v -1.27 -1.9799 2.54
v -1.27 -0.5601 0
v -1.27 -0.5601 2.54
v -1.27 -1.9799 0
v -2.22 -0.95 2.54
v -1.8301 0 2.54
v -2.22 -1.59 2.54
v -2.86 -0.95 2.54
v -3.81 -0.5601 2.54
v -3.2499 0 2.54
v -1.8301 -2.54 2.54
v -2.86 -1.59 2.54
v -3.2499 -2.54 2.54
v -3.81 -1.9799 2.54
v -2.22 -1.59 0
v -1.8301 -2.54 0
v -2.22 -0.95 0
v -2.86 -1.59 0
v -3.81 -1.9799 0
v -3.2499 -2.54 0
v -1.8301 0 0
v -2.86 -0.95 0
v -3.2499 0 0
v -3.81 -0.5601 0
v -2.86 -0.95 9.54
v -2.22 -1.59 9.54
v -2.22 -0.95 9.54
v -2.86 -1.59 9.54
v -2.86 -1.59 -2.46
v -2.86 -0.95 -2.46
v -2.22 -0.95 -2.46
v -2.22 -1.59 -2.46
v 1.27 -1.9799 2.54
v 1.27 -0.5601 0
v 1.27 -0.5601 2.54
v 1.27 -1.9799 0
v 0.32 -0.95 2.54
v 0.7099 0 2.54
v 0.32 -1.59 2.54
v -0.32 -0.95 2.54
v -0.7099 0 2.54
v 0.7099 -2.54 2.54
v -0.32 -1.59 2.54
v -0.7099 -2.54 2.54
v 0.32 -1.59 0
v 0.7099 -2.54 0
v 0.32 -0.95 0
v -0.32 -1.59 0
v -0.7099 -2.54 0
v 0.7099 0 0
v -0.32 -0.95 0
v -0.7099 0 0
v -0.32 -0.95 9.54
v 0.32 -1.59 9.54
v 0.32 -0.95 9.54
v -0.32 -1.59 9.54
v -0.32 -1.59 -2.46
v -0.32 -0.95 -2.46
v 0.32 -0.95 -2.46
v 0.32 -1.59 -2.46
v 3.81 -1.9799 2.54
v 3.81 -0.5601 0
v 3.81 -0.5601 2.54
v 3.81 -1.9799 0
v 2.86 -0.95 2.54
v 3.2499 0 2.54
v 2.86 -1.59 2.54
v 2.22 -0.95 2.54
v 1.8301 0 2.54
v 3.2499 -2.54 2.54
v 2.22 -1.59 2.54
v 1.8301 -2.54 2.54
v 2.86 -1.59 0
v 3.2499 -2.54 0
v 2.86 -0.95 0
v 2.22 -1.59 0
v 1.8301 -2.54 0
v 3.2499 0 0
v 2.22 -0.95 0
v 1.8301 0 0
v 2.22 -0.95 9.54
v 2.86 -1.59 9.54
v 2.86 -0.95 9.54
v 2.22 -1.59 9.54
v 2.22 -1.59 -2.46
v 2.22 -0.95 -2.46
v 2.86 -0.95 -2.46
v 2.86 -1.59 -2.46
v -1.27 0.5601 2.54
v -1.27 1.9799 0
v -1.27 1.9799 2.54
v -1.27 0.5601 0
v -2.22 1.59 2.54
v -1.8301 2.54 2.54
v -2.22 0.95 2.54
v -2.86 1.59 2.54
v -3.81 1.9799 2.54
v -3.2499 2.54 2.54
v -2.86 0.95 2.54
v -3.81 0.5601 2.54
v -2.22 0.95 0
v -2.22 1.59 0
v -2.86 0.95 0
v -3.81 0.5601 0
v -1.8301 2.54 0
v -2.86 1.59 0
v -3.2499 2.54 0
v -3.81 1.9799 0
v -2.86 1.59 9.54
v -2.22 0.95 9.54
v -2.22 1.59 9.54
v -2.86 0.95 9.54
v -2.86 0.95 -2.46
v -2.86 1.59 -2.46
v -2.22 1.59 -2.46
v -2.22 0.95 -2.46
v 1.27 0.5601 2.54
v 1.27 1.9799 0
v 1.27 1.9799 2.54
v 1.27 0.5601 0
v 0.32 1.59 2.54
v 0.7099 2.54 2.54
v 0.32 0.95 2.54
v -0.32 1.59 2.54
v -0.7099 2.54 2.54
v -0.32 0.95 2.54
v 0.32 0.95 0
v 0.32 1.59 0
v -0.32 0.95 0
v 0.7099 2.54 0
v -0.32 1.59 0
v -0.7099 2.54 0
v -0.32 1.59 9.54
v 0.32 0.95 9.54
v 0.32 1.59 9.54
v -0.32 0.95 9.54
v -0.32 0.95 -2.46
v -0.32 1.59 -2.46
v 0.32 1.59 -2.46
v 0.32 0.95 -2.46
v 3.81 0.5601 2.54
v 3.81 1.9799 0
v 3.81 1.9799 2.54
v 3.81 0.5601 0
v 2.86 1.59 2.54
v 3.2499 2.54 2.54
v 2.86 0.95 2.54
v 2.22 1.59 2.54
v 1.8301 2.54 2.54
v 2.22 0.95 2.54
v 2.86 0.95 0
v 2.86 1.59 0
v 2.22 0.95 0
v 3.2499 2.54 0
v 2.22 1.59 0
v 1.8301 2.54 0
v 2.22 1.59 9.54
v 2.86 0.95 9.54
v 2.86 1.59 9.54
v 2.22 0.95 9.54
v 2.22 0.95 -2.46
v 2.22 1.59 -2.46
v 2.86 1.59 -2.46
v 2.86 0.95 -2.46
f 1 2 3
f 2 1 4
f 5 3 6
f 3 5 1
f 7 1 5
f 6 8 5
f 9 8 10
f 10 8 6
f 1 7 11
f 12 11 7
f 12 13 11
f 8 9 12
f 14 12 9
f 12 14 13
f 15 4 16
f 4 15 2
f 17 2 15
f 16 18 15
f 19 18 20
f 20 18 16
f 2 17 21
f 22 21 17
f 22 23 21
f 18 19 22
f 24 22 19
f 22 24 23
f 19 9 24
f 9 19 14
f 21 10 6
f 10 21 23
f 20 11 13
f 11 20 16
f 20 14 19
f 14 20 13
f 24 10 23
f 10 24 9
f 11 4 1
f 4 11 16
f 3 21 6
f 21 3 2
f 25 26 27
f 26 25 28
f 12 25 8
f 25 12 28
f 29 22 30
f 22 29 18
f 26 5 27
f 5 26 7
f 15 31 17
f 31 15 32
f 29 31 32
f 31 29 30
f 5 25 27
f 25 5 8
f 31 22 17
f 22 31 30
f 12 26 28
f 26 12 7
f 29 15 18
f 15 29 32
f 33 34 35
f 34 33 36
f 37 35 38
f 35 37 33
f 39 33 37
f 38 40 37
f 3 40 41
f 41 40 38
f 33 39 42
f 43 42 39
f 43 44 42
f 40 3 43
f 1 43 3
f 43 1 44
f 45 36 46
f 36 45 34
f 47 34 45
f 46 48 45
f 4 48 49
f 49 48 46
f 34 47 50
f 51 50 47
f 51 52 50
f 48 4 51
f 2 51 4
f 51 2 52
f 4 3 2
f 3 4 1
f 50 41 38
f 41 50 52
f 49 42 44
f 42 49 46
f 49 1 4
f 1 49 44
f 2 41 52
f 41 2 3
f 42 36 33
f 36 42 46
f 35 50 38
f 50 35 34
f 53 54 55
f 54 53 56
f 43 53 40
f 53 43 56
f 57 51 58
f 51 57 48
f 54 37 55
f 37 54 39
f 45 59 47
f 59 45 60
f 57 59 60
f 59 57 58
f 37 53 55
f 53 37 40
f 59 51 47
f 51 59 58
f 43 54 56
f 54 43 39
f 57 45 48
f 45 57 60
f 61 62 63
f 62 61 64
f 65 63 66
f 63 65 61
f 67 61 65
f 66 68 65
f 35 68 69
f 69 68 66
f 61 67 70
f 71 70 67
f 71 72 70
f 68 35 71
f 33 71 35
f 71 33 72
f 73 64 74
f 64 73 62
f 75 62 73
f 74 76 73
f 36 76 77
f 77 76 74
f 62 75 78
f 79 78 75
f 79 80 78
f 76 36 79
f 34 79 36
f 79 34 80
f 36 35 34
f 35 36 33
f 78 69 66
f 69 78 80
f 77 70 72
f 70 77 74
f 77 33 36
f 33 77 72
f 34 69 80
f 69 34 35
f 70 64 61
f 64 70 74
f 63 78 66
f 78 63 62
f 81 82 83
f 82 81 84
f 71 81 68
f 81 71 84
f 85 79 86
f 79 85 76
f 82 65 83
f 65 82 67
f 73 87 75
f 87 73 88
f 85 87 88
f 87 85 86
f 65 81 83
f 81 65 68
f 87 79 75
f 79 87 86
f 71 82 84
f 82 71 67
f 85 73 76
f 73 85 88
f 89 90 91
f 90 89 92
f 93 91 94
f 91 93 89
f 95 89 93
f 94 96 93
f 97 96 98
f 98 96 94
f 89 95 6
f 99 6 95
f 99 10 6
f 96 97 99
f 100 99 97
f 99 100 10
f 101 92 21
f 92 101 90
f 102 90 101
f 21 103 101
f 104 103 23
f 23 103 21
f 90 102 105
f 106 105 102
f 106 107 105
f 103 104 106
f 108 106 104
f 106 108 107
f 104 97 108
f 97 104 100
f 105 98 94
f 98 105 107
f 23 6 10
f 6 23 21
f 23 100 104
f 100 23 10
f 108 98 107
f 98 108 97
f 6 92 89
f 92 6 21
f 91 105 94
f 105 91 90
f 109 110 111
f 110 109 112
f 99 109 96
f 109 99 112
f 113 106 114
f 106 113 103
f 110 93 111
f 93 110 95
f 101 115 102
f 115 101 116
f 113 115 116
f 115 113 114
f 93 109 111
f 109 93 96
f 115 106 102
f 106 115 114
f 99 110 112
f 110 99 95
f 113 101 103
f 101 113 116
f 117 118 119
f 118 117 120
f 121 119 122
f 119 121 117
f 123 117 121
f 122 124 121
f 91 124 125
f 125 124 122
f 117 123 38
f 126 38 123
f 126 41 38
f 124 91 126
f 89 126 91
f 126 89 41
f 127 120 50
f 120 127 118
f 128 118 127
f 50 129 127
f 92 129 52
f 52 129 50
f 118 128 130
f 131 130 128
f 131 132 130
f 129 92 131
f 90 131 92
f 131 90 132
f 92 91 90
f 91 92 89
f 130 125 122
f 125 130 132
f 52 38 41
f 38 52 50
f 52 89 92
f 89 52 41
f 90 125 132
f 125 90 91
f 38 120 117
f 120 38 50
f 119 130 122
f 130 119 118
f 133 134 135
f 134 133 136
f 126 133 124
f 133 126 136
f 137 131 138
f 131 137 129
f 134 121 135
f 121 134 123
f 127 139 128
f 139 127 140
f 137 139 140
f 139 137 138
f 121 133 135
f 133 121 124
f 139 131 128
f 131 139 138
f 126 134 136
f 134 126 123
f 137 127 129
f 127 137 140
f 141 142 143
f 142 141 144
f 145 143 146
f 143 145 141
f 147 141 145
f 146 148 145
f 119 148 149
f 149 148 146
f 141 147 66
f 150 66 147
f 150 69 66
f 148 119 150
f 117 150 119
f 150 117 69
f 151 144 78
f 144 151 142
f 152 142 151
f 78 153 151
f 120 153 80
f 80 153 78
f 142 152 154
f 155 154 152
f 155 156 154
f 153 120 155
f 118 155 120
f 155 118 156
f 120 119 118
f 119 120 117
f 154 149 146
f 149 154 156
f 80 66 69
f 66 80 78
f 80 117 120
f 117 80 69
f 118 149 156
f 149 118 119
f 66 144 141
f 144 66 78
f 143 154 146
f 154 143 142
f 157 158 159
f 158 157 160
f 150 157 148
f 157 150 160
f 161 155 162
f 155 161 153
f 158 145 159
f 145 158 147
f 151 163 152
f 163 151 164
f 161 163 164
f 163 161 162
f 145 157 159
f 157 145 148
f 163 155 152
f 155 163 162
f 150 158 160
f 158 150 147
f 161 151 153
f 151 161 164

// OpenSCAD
// pin_headers.scad
//
// Model of through-hole pin headers. 
// 
// Units are metric
//
// "height" is the total length of the pin. Default is 12mm.
// "upper" is the length of the pin above the stopper. Default is 7mm.
// "rows" is the number of rows. Default is 3.
// "cols" is the number of columns. Default is 2.
//
// Examples:
pin_header( 12, 7, 3, 2);
// pin_header( rows=5 cols=1 );
// By Paul McGovern

module pin_header( height=12, upper=7, rows=3, cols=2 ) {

	cl = 2.54;

	translate( [ -(rows  * cl/2 ) + cl /2, -(cols  * cl/2 ) + cl /2, 0 ] ) {

		for( col = [0: cols -1 ] ) {
			for( row = [0 : rows -1 ] ) {

				translate( [ cl * row , cl * col, 0] ) {
	
					color( "gray" )
						translate( [0,0, cl / 2]) {
							intersection() {
								cube( [ cl, cl, cl ], center=true );
								rotate( [0, 0, 45] ) cube( [ 2.8, 2.8, cl ], center=true );
						}
				}

				color( "silver" ) {
					translate( [0,0, (upper - ( height/2 )) + cl ] ) {
						union() {
							cube( [0.64,0.64,height], center=true );
							translate( [0,0, height/2 ] ) scale( 0.64 ) _pin_point();
							translate( [0,0, -height/2 ] ) scale( 0.64 )	rotate([180,0,0] )_pin_point();
						}
					}
				}
			}
		}
	}
}
}

module _pin_point() {
	translate( [-0.5,-0.5, 0])
		polyhedron( 
			points=[[0,0,0],[0,1,0],[1,1,0],[1,0,0],[0.5,0.5,0.5]], 
			triangles=[[0,1,2],[0,2,3],[0,1,4],[1,2,4],[2,3,4],[3,0,4]]);
}
